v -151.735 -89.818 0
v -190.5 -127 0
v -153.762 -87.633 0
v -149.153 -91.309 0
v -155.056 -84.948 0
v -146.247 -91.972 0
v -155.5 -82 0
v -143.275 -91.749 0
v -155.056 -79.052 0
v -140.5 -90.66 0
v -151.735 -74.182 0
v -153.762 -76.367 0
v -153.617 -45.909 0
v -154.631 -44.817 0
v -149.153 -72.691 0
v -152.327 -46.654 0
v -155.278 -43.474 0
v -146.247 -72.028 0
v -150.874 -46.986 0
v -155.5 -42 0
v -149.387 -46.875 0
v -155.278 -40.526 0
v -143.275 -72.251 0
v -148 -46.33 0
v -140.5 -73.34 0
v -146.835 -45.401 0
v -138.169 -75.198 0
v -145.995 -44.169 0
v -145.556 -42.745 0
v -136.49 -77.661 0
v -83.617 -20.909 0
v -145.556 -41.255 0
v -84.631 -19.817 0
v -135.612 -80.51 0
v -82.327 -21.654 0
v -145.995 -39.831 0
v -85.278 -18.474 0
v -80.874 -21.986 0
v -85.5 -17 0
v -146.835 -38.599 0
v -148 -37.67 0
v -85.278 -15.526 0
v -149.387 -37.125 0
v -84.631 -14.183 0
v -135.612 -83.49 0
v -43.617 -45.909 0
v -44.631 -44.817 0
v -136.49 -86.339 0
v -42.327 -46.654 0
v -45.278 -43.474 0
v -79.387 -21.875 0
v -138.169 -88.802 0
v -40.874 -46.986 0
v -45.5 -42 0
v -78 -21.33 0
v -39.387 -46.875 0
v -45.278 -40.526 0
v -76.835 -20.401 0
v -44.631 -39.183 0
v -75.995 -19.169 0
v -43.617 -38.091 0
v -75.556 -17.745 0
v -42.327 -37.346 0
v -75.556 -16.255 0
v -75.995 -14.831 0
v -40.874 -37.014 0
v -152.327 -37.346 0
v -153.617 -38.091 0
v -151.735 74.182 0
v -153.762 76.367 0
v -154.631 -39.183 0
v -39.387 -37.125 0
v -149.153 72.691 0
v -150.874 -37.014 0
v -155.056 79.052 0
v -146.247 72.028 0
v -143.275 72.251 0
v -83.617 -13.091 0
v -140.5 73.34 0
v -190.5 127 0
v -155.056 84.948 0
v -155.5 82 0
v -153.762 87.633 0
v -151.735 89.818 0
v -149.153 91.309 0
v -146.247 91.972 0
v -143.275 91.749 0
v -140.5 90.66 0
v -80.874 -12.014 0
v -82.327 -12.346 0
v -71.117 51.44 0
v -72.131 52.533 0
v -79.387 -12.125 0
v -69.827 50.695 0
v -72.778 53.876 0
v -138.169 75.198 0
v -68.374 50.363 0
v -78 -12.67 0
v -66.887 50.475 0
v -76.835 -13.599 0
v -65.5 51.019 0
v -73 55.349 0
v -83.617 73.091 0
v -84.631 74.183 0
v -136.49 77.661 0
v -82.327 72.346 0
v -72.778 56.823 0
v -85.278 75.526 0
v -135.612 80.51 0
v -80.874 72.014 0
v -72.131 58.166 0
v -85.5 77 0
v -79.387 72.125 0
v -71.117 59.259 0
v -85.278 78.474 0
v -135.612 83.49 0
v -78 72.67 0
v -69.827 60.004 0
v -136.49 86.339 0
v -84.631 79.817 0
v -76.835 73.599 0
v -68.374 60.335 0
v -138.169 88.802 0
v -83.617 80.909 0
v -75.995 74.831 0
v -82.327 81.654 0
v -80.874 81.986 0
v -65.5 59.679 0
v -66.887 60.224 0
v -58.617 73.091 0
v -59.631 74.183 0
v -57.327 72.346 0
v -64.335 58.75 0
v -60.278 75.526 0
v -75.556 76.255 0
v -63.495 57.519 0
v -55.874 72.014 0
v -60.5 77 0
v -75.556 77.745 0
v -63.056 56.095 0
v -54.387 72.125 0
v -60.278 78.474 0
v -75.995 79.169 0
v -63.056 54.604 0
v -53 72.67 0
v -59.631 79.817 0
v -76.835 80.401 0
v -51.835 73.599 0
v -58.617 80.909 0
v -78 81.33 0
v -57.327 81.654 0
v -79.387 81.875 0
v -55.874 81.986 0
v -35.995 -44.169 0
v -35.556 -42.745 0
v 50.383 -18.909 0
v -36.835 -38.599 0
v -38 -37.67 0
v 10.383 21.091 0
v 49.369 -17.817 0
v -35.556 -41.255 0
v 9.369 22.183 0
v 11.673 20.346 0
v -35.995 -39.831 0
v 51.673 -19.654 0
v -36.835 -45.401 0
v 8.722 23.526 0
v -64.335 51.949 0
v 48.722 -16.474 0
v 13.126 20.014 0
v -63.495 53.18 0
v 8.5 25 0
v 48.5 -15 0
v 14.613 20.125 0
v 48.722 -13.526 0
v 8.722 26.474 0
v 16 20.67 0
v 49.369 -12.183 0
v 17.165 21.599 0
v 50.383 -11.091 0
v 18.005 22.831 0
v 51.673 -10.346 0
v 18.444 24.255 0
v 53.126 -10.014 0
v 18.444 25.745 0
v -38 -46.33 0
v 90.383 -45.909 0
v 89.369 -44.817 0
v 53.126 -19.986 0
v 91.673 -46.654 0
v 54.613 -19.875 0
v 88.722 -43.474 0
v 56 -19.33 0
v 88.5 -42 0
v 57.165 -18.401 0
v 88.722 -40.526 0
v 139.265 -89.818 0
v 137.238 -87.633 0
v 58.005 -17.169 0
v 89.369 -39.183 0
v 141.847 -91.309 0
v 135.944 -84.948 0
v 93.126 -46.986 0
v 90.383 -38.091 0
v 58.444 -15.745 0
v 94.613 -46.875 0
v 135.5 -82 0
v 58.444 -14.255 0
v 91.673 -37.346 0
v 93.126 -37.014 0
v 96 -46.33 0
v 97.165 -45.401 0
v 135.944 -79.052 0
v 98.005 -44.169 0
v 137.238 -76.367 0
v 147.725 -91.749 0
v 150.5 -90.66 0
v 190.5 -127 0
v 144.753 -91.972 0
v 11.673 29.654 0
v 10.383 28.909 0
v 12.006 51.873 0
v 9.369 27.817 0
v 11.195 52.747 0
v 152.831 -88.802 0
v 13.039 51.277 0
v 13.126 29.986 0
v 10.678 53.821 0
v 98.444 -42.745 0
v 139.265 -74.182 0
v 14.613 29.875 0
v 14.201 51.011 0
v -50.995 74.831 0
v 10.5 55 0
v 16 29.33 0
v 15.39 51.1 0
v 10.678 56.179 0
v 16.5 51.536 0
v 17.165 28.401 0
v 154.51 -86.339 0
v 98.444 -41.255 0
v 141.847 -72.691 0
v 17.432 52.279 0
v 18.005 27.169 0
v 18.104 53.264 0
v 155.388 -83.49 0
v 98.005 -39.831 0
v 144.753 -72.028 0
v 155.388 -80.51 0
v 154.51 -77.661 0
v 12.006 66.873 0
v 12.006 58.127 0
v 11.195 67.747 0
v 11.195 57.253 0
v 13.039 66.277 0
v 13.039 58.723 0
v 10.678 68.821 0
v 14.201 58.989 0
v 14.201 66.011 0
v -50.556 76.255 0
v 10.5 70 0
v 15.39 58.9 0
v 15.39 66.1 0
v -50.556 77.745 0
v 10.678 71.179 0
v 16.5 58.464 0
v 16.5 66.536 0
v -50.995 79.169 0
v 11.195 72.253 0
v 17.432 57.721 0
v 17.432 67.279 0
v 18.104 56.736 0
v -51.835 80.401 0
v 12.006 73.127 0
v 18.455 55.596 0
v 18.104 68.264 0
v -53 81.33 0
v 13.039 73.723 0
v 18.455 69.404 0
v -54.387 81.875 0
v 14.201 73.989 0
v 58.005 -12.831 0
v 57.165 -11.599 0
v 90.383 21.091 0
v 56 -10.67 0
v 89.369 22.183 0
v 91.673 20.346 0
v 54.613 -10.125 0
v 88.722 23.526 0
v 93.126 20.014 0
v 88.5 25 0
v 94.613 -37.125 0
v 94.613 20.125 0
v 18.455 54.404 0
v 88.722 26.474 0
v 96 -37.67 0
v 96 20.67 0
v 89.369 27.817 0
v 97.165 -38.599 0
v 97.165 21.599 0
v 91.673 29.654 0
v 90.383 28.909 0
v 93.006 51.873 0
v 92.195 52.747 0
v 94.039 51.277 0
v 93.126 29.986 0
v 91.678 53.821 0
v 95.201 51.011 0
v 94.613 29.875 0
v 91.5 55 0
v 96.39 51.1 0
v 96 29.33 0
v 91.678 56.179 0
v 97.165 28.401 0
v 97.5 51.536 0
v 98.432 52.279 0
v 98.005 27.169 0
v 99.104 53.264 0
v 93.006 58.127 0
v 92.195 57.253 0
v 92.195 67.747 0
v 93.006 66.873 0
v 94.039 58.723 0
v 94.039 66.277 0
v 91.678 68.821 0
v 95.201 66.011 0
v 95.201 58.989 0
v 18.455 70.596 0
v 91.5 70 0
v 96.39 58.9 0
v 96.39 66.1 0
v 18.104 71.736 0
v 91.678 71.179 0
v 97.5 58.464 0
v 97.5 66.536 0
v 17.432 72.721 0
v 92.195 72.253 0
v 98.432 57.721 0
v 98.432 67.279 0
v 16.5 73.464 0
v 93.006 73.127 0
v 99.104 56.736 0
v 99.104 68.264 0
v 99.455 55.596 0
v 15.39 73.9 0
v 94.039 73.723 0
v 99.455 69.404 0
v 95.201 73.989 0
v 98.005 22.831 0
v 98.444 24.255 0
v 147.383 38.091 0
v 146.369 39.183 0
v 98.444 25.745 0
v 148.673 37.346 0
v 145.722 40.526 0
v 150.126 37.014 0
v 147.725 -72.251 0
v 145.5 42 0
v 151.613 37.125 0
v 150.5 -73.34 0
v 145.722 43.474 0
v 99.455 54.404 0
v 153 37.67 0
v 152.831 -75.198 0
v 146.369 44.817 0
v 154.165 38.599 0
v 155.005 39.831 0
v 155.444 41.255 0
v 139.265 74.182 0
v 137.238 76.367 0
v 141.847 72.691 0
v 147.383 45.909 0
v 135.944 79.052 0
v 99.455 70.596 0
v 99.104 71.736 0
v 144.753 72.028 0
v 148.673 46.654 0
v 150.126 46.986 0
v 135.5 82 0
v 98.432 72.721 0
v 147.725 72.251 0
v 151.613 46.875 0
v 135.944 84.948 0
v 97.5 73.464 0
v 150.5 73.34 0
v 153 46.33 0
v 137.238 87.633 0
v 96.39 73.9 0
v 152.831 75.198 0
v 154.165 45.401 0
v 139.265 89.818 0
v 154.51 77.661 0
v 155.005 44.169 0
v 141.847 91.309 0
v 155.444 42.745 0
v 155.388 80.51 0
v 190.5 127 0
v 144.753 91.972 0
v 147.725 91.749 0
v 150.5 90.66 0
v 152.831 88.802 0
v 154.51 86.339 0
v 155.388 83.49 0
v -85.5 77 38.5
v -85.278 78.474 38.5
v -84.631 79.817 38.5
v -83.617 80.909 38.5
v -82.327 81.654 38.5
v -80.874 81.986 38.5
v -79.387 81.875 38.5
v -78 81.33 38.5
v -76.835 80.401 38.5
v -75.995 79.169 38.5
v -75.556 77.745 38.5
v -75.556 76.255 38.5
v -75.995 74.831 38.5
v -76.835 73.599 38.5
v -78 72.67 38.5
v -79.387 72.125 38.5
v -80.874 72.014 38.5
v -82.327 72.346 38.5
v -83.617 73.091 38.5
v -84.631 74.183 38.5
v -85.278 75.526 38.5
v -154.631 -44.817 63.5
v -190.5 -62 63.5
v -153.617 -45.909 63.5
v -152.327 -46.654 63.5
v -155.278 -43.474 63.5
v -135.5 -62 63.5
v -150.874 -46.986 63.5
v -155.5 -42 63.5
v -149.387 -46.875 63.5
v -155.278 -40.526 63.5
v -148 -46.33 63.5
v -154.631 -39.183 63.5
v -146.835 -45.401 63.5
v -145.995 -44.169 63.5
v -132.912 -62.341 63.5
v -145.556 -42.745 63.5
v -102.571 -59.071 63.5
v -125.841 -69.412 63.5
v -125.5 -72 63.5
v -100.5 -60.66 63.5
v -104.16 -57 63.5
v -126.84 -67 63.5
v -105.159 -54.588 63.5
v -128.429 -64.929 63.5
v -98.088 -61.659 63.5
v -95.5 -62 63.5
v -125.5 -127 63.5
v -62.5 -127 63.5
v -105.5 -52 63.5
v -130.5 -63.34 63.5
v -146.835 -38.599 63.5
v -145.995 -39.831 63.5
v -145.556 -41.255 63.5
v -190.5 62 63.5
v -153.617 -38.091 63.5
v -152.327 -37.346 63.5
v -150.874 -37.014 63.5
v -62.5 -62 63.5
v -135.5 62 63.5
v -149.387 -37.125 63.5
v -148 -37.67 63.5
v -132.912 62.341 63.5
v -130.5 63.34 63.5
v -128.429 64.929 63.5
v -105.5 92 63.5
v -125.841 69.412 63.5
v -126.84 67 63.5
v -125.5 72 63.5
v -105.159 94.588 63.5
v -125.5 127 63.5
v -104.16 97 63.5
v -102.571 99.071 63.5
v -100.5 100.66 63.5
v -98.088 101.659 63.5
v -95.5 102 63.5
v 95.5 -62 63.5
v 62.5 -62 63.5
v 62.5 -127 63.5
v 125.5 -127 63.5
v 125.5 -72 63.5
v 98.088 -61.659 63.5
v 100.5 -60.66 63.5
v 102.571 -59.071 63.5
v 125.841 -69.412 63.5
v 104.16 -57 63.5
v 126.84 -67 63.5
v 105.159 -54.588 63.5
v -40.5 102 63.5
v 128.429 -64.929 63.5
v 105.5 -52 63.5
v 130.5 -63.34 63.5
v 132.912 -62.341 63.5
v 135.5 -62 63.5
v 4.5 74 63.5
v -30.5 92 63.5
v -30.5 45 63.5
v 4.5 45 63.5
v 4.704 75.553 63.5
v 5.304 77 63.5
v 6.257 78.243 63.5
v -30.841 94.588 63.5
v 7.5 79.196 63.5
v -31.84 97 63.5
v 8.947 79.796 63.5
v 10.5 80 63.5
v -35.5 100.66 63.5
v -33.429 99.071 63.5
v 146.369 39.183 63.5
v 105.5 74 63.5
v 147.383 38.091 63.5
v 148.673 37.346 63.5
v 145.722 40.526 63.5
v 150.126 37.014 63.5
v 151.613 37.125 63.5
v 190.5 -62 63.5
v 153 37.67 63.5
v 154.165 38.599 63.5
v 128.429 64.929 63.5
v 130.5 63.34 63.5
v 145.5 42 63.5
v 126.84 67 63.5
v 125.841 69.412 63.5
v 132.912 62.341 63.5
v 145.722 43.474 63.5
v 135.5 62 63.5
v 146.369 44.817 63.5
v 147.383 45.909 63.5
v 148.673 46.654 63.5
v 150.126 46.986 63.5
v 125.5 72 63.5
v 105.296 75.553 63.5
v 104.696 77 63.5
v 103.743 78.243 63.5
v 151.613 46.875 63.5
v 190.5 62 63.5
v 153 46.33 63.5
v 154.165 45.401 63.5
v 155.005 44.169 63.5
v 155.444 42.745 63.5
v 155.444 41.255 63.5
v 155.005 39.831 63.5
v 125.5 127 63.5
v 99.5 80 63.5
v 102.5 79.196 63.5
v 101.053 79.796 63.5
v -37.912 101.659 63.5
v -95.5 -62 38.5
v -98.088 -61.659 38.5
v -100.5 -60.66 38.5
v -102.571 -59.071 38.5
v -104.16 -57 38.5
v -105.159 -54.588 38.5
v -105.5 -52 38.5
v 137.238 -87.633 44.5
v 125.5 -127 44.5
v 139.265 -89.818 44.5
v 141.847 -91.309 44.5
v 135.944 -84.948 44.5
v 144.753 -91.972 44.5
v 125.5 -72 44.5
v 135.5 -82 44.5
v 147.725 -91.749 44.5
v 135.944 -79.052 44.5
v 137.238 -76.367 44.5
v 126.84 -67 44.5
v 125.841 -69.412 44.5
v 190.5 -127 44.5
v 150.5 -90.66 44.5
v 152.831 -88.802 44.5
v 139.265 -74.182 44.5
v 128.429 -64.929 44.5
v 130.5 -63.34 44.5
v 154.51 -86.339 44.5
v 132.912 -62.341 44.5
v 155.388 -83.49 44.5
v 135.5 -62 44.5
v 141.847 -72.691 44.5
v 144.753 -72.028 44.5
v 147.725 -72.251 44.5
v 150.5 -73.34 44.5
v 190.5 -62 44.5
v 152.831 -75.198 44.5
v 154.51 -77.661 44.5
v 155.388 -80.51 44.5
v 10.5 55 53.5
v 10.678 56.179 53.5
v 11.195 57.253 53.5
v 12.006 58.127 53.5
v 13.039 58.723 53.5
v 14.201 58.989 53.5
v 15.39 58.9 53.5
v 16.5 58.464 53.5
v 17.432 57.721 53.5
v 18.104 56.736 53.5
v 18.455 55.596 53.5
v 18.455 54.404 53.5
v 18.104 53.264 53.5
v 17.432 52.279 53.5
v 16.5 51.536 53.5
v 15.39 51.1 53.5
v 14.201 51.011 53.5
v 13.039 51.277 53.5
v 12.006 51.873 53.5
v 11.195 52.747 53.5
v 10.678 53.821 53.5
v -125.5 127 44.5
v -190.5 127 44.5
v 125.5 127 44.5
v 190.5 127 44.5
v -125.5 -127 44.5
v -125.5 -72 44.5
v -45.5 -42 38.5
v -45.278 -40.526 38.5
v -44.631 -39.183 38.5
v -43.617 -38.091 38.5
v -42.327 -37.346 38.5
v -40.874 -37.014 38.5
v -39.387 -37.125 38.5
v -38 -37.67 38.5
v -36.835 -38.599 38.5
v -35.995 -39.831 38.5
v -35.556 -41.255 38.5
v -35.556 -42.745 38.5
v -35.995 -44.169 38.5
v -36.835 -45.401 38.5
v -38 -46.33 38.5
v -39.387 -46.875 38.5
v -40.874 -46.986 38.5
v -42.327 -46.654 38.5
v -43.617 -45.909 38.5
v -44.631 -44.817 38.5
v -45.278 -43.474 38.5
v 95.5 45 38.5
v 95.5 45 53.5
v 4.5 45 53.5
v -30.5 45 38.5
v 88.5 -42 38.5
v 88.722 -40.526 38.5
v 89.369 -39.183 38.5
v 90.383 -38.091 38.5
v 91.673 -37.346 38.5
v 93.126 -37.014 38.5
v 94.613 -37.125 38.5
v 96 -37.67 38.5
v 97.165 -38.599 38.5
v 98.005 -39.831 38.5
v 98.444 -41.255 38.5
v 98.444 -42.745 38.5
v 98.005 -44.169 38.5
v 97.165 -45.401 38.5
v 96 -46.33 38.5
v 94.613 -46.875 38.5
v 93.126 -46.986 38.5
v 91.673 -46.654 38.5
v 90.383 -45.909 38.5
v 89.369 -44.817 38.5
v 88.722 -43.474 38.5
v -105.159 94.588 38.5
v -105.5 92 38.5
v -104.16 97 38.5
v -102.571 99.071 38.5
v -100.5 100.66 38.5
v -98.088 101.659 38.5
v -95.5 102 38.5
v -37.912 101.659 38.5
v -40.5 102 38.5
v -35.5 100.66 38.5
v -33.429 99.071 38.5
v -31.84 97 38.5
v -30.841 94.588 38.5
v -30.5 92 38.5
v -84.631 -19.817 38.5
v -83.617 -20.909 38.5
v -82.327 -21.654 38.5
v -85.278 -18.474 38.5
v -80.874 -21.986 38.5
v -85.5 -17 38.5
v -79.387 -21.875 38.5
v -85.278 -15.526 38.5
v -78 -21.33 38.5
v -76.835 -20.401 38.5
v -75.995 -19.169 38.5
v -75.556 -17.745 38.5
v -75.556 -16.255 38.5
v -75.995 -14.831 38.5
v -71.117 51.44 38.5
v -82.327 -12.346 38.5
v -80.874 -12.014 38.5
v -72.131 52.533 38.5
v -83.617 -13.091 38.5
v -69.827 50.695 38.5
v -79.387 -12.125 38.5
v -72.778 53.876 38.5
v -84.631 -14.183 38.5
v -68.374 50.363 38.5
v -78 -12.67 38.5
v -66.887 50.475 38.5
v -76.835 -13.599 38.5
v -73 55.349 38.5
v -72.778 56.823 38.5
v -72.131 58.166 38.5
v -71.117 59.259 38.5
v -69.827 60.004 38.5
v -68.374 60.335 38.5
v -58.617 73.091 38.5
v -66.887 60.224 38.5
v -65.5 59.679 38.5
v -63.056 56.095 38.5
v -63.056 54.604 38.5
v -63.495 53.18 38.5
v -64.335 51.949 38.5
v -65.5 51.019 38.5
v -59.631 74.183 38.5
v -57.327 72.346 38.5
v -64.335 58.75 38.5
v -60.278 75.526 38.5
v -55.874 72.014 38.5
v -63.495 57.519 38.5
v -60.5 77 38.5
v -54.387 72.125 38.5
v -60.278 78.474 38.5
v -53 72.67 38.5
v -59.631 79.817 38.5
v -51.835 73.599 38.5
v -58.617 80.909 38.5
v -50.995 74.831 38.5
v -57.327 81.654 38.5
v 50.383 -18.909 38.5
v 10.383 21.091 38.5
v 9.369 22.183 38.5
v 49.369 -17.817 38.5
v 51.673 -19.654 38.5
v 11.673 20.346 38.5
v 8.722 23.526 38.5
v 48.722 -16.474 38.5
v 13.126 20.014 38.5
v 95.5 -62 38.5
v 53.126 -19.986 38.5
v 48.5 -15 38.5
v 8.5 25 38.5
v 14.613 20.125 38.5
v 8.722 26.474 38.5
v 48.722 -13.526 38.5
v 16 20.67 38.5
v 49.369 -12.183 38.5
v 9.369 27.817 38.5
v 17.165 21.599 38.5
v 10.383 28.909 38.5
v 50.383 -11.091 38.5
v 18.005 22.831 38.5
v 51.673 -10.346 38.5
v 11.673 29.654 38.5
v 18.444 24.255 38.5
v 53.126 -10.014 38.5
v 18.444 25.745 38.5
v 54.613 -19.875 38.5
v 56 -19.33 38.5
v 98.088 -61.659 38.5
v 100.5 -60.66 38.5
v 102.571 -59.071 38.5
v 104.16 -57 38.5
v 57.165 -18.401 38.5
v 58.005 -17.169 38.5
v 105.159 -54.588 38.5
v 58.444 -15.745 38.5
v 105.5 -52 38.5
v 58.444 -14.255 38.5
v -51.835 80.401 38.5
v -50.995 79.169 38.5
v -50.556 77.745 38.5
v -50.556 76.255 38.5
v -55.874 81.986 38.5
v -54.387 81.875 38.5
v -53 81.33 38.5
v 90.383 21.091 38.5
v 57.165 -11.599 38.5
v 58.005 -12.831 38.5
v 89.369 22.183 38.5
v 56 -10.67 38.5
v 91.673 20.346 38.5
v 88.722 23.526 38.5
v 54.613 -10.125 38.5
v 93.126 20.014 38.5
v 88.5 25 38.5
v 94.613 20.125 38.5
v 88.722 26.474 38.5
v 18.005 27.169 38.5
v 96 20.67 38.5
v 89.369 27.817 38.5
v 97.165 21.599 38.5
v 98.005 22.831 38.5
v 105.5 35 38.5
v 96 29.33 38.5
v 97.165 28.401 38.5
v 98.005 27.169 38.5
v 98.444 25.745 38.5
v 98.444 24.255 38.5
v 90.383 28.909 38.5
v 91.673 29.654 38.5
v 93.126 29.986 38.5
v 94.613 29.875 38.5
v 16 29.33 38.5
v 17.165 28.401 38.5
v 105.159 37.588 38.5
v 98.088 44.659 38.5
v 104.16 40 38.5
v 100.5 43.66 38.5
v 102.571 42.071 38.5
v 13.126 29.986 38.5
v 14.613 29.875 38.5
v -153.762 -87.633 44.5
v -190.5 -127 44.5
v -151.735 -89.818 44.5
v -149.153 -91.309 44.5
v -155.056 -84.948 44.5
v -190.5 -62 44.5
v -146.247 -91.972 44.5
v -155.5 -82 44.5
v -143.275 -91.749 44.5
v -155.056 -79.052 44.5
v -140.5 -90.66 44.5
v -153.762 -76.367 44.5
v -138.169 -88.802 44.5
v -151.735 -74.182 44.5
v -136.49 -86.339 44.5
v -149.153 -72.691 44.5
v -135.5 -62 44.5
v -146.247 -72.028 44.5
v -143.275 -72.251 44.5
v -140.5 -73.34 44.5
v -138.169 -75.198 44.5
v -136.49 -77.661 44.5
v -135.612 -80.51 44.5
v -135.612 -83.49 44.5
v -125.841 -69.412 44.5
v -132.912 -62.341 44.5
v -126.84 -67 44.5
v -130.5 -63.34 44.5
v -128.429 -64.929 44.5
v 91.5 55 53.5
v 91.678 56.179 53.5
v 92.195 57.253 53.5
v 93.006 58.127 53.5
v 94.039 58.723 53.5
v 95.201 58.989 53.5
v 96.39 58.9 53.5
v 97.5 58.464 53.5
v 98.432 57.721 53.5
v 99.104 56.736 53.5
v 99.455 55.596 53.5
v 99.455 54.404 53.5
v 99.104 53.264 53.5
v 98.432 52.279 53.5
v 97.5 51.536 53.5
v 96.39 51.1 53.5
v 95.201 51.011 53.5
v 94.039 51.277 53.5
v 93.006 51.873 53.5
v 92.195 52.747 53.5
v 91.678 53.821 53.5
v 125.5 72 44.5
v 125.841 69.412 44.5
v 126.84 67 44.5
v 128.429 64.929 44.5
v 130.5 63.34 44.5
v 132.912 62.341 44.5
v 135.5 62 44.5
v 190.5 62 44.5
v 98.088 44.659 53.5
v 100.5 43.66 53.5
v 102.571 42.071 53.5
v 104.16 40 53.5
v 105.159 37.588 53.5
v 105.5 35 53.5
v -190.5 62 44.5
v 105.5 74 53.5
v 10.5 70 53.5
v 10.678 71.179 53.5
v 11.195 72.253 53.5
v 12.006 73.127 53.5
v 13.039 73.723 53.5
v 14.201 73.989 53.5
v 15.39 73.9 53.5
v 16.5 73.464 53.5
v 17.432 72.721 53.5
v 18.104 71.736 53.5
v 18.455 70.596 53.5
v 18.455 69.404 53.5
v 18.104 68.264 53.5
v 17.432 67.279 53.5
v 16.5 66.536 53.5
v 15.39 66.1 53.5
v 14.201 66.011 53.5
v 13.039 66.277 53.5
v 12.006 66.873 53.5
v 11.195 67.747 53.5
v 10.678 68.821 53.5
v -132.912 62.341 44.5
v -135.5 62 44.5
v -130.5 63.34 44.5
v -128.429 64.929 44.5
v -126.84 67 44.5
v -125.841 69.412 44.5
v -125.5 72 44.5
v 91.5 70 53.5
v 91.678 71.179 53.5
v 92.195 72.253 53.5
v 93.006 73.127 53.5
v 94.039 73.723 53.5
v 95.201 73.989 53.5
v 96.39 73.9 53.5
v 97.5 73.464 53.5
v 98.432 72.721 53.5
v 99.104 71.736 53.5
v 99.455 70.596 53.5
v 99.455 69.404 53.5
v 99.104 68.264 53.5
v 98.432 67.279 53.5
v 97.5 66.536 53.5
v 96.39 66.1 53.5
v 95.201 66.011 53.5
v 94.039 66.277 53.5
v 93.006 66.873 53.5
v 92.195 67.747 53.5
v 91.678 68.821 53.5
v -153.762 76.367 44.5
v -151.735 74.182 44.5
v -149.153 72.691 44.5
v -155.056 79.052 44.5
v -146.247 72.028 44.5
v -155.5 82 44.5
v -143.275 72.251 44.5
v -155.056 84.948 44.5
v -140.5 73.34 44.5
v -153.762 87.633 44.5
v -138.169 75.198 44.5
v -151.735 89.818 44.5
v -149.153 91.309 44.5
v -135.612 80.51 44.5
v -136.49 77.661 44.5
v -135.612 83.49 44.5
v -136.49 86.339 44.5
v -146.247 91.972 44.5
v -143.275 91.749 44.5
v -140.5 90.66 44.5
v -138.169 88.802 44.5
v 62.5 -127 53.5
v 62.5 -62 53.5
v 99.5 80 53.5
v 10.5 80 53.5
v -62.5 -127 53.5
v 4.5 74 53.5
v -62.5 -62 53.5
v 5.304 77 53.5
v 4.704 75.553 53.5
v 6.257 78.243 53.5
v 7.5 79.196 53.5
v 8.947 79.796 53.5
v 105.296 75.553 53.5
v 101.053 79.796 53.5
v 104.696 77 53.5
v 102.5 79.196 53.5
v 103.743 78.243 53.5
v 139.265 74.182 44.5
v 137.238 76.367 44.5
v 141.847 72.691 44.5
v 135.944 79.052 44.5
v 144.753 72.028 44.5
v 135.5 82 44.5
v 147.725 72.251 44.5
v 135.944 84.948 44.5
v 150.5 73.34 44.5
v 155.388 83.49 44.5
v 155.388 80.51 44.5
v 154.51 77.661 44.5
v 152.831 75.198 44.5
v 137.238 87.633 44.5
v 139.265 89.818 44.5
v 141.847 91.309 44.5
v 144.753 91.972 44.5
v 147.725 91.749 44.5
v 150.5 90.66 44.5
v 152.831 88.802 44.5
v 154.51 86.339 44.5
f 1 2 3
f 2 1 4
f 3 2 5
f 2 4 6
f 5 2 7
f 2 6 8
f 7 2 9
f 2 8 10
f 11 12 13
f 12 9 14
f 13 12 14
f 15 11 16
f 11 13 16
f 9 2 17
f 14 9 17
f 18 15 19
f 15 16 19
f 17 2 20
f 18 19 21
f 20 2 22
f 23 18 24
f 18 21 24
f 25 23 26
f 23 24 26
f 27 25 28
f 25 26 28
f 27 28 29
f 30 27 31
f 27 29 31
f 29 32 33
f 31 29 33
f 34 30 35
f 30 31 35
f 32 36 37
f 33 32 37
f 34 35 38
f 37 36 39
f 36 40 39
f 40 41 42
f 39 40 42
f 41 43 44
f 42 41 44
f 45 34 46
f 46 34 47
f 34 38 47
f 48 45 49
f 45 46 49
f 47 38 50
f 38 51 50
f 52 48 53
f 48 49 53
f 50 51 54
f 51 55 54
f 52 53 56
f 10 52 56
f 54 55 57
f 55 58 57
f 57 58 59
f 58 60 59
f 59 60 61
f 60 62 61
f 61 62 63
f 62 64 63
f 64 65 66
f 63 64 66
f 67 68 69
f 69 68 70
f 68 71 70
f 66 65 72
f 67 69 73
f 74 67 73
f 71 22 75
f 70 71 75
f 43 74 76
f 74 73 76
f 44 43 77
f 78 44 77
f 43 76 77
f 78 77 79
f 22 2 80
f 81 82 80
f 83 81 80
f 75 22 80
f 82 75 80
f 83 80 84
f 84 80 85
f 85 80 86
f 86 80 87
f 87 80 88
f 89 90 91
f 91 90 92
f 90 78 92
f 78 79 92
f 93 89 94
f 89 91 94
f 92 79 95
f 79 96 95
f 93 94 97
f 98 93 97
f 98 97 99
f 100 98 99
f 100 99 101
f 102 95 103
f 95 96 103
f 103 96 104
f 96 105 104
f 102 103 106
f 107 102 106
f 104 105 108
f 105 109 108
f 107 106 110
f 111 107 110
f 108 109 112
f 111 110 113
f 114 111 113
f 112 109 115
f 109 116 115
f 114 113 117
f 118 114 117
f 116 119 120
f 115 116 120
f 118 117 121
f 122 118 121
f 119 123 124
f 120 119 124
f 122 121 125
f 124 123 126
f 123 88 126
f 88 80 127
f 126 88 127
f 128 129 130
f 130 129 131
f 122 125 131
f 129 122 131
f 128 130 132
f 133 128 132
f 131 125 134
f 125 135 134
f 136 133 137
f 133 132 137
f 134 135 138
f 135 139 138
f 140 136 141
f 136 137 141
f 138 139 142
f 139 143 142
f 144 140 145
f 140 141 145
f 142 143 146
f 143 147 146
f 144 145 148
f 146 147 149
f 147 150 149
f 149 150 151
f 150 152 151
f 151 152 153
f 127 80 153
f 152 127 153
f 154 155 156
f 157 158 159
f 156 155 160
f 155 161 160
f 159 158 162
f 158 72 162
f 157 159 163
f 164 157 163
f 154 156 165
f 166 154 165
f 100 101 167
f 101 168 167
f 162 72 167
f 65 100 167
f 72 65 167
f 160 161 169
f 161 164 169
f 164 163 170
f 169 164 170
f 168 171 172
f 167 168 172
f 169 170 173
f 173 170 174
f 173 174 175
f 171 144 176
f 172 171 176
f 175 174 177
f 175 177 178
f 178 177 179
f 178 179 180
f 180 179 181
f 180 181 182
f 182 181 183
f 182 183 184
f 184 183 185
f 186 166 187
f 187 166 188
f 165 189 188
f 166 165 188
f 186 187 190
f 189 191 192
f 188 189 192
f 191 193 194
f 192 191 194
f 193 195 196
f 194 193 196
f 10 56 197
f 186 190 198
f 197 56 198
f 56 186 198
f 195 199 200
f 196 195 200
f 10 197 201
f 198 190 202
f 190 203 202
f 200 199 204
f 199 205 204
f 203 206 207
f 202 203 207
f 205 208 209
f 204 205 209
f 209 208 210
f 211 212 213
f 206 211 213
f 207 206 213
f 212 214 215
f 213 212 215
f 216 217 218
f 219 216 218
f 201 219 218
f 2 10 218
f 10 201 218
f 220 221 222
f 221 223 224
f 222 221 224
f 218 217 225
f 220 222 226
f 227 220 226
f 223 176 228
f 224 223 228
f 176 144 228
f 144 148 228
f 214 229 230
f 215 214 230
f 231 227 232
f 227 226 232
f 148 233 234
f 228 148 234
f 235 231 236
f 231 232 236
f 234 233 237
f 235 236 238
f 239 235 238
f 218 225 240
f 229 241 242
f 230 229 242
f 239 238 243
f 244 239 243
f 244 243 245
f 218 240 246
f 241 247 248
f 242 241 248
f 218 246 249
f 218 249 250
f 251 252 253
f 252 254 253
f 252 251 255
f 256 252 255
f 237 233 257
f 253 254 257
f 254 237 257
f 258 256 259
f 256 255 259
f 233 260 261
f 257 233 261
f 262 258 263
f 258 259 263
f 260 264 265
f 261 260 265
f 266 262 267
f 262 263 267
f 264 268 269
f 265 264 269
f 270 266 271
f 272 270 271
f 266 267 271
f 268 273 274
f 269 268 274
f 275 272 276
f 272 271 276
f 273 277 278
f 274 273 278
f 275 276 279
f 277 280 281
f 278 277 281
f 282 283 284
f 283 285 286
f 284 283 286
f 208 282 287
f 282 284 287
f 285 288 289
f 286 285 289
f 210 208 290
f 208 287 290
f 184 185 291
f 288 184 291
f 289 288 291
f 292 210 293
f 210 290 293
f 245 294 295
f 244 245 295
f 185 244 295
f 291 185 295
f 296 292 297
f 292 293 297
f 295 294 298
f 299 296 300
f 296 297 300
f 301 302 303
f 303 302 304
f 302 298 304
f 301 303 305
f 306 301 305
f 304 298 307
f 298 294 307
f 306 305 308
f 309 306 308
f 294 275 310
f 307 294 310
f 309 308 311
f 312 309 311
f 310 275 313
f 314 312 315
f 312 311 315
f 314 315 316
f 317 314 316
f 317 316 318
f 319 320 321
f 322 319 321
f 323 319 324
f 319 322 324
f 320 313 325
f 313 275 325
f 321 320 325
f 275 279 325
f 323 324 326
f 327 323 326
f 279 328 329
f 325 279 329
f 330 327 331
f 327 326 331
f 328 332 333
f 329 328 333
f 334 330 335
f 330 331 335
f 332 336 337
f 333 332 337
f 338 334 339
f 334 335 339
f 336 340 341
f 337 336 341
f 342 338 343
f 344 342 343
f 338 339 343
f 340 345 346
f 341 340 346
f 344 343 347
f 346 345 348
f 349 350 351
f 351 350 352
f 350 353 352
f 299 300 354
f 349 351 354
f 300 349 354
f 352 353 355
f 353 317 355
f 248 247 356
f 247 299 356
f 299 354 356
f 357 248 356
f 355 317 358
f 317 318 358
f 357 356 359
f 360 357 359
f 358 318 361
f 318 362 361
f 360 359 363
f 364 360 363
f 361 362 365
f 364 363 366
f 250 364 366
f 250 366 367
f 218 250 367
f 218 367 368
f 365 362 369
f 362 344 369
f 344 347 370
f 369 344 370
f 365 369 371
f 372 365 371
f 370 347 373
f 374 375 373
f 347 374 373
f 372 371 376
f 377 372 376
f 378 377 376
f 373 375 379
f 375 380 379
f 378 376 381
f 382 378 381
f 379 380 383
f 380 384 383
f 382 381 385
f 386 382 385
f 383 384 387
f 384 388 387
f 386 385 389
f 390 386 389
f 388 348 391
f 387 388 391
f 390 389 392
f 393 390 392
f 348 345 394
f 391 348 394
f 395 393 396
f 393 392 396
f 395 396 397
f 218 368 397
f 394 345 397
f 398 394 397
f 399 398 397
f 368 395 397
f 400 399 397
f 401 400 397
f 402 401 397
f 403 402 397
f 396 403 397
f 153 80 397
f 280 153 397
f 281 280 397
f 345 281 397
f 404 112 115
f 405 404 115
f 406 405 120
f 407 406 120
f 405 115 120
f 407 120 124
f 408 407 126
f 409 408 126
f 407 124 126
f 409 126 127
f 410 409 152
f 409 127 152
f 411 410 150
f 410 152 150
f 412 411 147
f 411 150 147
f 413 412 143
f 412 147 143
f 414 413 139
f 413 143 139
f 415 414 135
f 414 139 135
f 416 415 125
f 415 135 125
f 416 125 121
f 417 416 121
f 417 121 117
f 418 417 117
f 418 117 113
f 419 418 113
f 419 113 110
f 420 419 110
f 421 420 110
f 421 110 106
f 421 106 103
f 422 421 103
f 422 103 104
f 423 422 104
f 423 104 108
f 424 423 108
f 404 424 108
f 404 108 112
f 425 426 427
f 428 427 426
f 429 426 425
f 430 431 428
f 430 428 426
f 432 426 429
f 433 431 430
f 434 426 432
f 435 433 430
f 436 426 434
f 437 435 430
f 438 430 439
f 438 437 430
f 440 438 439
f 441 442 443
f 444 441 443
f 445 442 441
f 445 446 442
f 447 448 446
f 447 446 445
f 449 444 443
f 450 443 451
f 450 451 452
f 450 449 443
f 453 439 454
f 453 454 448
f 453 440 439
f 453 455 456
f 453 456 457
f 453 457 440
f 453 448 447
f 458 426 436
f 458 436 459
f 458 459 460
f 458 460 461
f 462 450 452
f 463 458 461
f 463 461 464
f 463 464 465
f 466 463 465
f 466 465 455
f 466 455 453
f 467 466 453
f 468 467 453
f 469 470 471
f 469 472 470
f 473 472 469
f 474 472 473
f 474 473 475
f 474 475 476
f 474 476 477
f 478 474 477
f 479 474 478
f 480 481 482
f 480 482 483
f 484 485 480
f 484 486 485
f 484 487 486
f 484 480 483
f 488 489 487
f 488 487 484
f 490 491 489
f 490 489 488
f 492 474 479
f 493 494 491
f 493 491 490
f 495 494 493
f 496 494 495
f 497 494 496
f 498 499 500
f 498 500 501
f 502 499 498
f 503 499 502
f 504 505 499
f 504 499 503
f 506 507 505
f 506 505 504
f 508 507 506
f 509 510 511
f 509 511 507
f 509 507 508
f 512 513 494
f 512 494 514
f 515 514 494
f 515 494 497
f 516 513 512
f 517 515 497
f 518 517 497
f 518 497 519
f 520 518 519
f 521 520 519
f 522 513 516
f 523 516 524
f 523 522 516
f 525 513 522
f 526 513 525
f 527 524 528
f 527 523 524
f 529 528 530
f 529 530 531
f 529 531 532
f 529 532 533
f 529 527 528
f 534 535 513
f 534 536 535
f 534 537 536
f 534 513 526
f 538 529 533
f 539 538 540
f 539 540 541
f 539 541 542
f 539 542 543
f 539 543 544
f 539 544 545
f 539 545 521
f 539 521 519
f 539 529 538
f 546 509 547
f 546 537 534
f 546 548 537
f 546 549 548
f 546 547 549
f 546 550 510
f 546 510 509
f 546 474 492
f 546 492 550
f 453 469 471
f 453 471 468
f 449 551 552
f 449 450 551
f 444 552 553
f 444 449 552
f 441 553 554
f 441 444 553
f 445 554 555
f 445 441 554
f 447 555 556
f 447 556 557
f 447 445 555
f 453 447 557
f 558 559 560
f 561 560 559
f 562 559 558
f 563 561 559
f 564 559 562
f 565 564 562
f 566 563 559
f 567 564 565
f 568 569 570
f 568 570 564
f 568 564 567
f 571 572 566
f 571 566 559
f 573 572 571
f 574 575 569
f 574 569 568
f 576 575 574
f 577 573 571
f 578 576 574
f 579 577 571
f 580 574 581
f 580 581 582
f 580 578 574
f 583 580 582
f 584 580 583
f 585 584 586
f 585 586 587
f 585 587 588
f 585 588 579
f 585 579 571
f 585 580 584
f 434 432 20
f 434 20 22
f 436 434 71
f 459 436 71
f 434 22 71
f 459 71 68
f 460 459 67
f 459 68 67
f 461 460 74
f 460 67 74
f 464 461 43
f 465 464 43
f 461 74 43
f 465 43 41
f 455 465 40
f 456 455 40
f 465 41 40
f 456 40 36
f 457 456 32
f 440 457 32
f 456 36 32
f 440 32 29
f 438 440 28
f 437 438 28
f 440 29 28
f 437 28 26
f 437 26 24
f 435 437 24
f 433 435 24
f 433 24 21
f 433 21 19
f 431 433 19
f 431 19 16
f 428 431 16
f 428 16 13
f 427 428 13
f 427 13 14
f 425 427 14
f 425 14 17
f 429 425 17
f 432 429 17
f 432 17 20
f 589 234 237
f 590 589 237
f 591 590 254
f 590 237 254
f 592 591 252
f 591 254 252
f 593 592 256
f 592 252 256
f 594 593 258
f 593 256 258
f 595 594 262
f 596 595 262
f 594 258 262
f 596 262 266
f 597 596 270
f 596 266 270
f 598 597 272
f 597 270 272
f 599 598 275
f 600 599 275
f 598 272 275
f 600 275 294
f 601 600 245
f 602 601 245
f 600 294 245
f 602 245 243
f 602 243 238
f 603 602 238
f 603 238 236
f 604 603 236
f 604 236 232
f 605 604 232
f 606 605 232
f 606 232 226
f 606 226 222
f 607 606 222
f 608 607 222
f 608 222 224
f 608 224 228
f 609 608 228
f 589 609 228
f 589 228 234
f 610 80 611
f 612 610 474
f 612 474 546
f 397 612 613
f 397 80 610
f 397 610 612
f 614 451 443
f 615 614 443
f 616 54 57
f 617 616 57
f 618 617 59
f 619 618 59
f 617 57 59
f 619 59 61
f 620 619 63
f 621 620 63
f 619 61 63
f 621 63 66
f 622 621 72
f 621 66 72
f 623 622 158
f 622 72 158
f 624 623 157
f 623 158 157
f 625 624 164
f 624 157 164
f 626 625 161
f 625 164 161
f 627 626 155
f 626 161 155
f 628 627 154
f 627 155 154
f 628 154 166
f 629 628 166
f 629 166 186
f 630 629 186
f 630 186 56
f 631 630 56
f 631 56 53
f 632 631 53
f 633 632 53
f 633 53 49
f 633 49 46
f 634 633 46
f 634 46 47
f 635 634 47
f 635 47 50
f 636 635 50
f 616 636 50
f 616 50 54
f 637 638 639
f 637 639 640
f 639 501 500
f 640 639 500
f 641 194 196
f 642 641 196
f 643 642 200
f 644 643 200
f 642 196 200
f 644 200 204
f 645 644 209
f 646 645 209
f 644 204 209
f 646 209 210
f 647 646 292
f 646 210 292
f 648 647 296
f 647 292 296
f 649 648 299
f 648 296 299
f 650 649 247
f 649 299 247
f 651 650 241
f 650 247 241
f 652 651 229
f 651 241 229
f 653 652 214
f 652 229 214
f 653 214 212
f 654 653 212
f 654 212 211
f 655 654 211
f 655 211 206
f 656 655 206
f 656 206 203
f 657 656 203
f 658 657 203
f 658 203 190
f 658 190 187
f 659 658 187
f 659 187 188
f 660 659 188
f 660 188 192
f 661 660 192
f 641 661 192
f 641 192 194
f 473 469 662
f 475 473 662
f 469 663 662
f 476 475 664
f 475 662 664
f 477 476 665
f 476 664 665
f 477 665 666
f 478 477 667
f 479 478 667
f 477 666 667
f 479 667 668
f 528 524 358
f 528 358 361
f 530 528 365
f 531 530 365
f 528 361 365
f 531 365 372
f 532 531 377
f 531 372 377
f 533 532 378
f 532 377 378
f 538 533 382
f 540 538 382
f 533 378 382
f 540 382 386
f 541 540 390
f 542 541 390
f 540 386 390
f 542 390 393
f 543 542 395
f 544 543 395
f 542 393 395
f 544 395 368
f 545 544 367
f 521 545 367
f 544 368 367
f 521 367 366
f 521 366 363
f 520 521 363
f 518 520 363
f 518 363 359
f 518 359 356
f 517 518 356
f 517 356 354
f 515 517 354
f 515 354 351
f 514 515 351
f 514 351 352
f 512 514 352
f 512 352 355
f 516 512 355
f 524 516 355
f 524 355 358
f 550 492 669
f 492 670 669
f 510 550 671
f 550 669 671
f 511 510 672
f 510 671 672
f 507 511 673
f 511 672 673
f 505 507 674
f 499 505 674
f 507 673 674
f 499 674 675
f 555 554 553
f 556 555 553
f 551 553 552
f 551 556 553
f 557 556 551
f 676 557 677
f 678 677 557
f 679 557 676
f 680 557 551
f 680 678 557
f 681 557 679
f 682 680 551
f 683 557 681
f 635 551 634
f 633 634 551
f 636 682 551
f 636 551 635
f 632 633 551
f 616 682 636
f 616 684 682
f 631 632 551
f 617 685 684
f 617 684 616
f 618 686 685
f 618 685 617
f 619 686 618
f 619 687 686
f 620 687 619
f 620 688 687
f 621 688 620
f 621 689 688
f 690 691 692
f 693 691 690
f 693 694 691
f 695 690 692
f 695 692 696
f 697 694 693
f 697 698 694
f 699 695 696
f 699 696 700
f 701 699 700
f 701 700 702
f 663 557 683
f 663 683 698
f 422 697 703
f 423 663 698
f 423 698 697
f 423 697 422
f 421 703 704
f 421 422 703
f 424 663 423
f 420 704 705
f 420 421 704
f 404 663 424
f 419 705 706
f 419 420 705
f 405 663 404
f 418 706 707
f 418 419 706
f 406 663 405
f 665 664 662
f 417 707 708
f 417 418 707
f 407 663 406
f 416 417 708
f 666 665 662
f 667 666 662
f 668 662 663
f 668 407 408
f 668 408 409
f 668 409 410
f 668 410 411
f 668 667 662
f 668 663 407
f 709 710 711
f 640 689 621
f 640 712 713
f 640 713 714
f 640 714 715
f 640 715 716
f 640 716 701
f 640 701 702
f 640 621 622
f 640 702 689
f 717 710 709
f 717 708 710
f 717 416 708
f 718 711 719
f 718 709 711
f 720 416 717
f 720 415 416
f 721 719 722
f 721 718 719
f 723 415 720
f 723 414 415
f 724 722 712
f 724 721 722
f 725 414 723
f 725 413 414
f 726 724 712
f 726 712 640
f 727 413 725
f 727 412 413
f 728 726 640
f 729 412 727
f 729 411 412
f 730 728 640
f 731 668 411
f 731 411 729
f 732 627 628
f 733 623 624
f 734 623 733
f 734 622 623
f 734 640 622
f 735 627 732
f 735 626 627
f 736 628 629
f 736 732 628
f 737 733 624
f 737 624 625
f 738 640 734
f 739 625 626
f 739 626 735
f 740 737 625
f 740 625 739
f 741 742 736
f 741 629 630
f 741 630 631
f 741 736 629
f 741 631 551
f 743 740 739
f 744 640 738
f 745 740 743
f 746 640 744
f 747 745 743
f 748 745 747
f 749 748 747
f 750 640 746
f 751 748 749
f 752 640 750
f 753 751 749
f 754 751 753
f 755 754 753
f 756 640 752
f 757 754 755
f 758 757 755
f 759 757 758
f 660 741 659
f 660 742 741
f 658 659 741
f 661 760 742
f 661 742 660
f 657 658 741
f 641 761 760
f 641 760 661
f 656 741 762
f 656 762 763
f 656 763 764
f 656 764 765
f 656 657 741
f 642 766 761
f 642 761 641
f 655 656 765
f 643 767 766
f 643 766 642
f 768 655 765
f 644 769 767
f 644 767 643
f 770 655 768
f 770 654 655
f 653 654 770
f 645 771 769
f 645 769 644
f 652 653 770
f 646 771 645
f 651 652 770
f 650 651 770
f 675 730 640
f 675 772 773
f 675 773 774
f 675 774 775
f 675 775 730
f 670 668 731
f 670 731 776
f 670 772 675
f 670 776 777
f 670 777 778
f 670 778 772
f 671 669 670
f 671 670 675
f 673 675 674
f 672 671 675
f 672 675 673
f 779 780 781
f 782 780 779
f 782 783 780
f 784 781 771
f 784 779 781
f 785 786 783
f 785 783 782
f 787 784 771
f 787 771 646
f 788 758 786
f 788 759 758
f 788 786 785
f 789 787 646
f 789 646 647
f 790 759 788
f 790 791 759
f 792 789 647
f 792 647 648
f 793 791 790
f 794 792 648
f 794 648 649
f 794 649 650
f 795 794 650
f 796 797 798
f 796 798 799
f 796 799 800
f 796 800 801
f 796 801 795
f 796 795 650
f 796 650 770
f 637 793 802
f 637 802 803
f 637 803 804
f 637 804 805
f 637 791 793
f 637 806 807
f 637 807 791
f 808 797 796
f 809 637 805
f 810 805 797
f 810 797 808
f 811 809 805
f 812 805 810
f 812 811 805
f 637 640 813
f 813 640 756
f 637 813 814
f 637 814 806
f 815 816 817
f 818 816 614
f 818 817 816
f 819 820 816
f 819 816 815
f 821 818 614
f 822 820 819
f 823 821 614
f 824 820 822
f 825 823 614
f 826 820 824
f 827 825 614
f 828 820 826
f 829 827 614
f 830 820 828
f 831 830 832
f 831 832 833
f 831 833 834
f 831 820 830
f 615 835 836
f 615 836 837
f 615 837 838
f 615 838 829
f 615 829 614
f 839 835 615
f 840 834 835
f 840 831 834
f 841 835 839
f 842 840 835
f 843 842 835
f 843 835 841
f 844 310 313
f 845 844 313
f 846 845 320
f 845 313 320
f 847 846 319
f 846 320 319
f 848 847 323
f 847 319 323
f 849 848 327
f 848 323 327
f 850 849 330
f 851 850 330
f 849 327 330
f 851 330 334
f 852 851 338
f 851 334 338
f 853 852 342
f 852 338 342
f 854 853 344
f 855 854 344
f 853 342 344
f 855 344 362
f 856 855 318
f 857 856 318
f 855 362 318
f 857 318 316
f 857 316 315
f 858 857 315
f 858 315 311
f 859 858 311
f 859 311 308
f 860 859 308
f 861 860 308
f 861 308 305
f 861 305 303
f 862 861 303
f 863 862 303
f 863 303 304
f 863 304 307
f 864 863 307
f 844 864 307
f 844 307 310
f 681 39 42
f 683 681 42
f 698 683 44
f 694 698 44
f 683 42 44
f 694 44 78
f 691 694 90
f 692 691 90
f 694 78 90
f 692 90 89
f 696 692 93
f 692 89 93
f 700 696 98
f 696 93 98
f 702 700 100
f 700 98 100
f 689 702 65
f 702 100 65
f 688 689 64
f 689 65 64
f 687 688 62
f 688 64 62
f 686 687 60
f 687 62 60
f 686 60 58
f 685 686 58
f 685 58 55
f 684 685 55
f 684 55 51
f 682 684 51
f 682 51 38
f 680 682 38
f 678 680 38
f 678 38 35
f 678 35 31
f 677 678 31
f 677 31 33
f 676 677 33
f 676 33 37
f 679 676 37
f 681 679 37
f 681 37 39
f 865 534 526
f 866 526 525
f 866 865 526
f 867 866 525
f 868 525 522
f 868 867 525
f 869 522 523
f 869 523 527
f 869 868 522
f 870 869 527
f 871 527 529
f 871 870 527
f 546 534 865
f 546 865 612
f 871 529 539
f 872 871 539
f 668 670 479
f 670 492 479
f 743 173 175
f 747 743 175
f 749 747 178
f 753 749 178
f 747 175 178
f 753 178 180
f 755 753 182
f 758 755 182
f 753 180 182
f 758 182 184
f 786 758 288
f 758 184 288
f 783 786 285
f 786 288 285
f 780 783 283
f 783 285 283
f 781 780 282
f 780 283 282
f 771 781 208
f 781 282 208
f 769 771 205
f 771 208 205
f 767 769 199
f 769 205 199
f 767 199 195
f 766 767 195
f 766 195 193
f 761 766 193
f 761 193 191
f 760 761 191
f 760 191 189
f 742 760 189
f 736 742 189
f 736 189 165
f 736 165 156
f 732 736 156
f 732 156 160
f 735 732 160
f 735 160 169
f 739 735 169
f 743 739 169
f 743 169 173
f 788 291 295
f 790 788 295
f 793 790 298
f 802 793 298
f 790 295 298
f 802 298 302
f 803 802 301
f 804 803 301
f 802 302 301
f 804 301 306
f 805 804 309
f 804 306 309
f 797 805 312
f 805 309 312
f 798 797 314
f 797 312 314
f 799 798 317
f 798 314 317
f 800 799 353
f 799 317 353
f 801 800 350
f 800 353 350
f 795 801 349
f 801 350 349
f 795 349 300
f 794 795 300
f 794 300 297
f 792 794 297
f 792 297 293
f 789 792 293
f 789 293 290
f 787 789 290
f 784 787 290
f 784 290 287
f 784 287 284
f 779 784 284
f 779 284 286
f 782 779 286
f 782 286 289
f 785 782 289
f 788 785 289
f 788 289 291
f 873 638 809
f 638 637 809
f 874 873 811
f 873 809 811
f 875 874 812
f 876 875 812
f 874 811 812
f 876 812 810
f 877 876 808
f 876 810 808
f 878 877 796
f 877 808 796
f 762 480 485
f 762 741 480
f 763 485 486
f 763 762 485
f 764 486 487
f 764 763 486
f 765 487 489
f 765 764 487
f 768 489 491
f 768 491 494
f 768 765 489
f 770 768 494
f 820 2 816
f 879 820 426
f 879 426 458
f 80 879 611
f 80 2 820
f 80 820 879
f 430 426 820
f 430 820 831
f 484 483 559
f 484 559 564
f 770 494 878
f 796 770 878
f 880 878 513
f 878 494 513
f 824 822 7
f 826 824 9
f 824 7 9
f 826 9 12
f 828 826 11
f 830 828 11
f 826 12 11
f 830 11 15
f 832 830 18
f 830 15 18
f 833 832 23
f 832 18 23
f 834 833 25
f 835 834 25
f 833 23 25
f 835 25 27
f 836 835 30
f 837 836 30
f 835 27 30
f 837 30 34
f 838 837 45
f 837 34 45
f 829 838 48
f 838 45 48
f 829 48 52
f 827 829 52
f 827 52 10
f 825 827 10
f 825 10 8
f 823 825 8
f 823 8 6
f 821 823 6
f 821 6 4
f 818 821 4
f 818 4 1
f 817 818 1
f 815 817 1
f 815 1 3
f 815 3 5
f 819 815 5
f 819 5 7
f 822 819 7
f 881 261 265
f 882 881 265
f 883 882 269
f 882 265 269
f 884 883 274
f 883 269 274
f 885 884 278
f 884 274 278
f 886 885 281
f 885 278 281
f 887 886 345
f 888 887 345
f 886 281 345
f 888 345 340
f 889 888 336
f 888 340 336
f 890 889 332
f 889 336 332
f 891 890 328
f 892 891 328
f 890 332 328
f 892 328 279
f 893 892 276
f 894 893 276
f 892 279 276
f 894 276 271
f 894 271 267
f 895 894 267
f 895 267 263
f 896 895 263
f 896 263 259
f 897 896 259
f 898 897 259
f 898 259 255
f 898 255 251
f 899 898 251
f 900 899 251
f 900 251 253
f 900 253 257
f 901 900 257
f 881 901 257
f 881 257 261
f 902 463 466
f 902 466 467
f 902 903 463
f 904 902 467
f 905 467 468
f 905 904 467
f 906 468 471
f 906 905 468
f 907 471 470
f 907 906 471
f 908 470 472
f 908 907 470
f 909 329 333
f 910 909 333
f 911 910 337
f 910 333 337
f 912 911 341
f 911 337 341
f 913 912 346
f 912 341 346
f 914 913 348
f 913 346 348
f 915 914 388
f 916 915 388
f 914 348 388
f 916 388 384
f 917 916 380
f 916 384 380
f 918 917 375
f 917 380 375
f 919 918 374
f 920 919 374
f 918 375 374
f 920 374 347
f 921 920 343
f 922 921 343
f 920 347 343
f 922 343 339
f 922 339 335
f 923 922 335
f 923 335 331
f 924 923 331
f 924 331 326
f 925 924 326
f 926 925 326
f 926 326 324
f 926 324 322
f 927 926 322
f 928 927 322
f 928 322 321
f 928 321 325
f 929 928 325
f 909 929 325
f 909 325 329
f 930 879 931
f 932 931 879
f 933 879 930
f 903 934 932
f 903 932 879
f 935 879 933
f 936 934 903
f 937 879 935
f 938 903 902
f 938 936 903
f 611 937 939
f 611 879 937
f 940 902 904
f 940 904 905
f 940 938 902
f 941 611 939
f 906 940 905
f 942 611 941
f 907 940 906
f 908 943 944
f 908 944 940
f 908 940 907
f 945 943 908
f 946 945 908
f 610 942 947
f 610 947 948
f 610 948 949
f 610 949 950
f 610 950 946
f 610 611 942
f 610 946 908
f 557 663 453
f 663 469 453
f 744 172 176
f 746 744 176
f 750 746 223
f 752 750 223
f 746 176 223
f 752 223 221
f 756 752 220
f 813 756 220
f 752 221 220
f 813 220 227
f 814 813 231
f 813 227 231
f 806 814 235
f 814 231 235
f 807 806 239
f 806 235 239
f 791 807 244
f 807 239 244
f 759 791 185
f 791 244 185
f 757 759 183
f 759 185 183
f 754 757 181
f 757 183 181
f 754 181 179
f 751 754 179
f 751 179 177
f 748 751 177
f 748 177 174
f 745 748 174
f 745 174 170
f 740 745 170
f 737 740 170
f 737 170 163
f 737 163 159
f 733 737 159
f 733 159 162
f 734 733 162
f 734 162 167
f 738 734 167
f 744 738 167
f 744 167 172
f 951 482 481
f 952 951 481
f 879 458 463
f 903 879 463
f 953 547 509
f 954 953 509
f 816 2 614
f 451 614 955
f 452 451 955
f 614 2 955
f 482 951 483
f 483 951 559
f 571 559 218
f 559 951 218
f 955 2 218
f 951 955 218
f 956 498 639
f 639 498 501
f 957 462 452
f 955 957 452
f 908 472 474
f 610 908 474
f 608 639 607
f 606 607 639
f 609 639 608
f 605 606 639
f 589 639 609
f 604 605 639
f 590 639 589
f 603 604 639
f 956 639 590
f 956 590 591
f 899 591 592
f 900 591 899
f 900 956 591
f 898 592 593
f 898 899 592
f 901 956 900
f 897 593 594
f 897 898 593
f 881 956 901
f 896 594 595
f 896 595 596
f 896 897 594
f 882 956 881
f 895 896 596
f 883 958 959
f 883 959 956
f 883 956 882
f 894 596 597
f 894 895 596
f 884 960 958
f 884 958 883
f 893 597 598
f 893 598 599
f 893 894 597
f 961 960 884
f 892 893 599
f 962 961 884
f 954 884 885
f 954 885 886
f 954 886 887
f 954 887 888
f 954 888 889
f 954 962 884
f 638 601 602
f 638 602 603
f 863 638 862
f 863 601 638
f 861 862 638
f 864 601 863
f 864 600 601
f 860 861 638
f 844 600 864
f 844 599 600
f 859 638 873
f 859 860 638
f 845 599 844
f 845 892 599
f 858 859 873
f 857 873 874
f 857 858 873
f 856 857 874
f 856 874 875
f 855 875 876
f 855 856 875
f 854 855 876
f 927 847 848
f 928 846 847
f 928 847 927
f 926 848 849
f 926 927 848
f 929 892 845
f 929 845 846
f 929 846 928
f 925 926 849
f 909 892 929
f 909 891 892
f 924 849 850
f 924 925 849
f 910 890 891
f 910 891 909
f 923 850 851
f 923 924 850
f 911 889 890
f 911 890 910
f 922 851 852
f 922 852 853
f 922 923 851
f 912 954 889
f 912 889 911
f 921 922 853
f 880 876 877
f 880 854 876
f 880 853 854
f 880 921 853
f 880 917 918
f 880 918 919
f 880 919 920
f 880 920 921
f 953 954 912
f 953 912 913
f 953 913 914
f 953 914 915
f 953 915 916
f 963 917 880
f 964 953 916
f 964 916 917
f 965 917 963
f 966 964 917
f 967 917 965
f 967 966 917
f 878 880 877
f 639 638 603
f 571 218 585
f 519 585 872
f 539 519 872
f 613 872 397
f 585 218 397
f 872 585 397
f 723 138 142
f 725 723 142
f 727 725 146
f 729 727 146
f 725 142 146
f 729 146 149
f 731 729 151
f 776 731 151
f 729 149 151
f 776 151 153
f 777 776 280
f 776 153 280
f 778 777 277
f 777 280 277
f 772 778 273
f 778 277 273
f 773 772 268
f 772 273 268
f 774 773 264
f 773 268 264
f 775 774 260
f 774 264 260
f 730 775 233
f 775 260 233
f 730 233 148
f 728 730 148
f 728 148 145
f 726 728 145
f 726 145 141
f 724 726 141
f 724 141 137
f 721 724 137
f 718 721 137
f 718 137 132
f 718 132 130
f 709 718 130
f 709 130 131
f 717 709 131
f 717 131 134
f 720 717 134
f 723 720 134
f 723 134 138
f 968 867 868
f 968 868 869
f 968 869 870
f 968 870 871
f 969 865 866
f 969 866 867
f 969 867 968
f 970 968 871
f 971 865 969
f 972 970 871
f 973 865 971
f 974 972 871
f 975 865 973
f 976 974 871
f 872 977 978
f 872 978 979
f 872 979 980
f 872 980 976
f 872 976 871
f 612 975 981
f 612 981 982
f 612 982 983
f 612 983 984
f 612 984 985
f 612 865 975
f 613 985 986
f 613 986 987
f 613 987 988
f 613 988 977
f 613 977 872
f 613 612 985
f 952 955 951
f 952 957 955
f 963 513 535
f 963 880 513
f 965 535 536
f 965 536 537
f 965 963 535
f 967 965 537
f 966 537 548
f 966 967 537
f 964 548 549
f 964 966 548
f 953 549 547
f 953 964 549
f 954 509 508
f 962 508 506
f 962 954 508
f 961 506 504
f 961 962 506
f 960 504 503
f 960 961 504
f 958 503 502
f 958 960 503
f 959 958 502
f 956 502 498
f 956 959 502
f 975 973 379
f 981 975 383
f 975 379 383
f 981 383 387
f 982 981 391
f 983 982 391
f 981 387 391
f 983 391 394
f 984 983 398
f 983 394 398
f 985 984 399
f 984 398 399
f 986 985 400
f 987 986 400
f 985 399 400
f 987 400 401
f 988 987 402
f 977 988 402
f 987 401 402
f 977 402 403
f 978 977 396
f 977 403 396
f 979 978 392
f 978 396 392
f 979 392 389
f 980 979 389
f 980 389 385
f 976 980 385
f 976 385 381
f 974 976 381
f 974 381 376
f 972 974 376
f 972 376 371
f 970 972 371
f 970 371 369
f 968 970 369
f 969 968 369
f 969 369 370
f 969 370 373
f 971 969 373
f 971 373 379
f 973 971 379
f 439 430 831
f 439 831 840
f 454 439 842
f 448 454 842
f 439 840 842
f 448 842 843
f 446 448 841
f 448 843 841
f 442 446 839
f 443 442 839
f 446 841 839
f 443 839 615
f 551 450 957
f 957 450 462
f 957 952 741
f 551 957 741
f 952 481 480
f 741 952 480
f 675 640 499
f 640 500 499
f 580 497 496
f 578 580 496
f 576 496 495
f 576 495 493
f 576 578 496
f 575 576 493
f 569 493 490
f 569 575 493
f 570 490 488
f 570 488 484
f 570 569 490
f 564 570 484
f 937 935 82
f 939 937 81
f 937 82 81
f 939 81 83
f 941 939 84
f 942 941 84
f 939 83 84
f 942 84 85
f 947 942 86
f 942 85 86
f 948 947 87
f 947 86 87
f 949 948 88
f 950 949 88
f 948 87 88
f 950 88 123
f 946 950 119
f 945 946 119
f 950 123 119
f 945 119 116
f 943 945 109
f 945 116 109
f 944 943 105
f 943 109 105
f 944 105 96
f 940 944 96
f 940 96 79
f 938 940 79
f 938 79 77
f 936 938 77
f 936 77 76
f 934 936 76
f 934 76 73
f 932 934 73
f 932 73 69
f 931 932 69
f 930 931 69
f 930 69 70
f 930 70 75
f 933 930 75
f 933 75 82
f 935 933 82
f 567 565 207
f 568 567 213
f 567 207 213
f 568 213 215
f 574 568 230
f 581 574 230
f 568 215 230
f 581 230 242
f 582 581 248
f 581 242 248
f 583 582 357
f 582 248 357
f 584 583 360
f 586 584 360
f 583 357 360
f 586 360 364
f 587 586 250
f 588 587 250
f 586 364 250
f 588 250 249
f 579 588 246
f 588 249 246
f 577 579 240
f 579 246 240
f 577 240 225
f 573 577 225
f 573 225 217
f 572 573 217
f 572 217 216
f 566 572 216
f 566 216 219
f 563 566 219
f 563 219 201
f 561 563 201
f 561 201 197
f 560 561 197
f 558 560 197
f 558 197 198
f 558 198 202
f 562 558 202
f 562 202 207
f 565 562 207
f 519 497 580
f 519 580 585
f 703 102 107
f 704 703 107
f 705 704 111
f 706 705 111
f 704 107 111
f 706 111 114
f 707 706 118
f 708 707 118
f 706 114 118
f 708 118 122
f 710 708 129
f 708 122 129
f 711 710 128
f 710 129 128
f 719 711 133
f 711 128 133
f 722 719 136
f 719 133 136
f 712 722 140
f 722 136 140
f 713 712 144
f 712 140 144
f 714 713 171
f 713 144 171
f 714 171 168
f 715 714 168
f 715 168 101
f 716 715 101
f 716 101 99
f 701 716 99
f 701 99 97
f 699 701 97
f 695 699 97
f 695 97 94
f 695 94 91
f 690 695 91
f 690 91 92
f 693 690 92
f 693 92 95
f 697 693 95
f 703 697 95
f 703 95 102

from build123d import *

# Parameters (mm, degrees)
CROQUIS1_W                      = 381
CROQUIS1_H                      = 254
SALIENTE_EXTRUIR1_DEPTH         = 63.5
CROQUIS2_W                      = 65
CROQUIS2_H                      = 65
CORTAR_EXTRUIR1_DEPTH           = 19
CORTAR_EXTRUIR2_DEPTH           = 10
CORTAR_EXTRUIR3_DEPTH           = 15
DI_METRO_DE_TALADRO_20_0_20_1_D = 20
DI_METRO_DE_TALADRO_10_0_10_1_D = 10
DI_METRO_DE_TALADRO_10_0_10_2_D = 10
DI_METRO_DE_TALADRO_8_0_8_1_D   = 8
REDONDEO1_R                     = 10
REDONDEO2_R                     = 6


with BuildPart() as part:
    # Croquis1 → Saliente-Extruir1 (new body)
    with BuildSketch(Plane.XY):
        Rectangle(CROQUIS1_W, CROQUIS1_H)
    extrude(amount=SALIENTE_EXTRUIR1_DEPTH)

    # Croquis2 → Cortar-Extruir1 (cut)
    with BuildSketch(Plane.XY.offset(63.5)):
        with Locations((-158, 94.5)):
            Rectangle(CROQUIS2_W, CROQUIS2_H)
        with Locations((-158, -94.5)):
            Rectangle(CROQUIS2_W, CROQUIS2_H)
        with Locations((158, -94.5)):
            Rectangle(CROQUIS2_W, CROQUIS2_H)
        with Locations((158, 94.5)):
            Rectangle(CROQUIS2_W, CROQUIS2_H)
    extrude(amount=-CORTAR_EXTRUIR1_DEPTH, mode=Mode.SUBTRACT)

    # Croquis3 → Cortar-Extruir2 (cut)
    with BuildSketch(Plane.XY.offset(63.5)):
        Polygon((62.5, -127), (62.5, -62), (105.5, -62), (105.5, 80), (4.5, 80), (4.5, 45), (-30.5, 45), (-30.5, 102), (-105.5, 102), (-105.5, -62), (-62.5, -62), (-62.5, -127), align=None)
    extrude(amount=-CORTAR_EXTRUIR2_DEPTH, mode=Mode.SUBTRACT)

    # Croquis4 → Cortar-Extruir3 (cut)
    with BuildSketch(Plane.XY.offset(53.5)):
        Polygon((105.5, -62), (105.5, 45), (-30.5, 45), (-30.5, 102), (-105.5, 102), (-105.5, -62), align=None)
    extrude(amount=-CORTAR_EXTRUIR3_DEPTH, mode=Mode.SUBTRACT)

    # Diámetro de taladro Ø20.0 (20)1 (through all)
    with Locations(Plane.XY.offset(44.5)):
        with Locations((-145.5, 82), (-145.5, -82), (145.5, -82), (145.5, 82)):
            Hole(DI_METRO_DE_TALADRO_20_0_20_1_D / 2)

    # Diámetro de taladro Ø10.0 (10)1 (through all)
    with Locations(Plane.XY.offset(38.5)):
        with Locations((-80.5, 77), (-55.5, 77), (-68, 55.349364905), (-80.5, -17), (-40.5, -42), (13.5, 25), (53.5, -15), (93.5, 25), (93.5, -42)):
            Hole(DI_METRO_DE_TALADRO_10_0_10_1_D / 2)

    # Diámetro de taladro Ø10.0 (10)2 (through all)
    with Locations(Plane.XY.offset(63.5)):
        with Locations((-150.5, -42), (150.5, 42)):
            Hole(DI_METRO_DE_TALADRO_10_0_10_2_D / 2)

    # Diámetro de taladro Ø8.0 (8)1 (through all)
    with Locations(Plane.XY.offset(53.5)):
        with Locations((14.5, 70), (95.5, 70), (95.5, 55), (14.5, 55)):
            Hole(DI_METRO_DE_TALADRO_8_0_8_1_D / 2)

    # Redondeo1
    redondeo1_edges = [part.edges().sort_by_distance(p)[0] for p in [
        (105.5, 45, 46),
        (125.5, 62, 54),
        (125.5, -62, 54),
        (-125.5, -62, 54),
        (-125.5, 62, 54),
        (-105.5, -62, 51),
        (-105.5, 102, 51),
        (-30.5, 102, 51),
        (105.5, -62, 51),
    ]]
    fillet(redondeo1_edges, radius=REDONDEO1_R)

    # Redondeo2
    redondeo2_edges = [part.edges().sort_by_distance(p)[0] for p in [
        (4.5, 80, 58.5),
        (105.5, 80, 58.5),
    ]]
    fillet(redondeo2_edges, radius=REDONDEO2_R)


solid = part.part
